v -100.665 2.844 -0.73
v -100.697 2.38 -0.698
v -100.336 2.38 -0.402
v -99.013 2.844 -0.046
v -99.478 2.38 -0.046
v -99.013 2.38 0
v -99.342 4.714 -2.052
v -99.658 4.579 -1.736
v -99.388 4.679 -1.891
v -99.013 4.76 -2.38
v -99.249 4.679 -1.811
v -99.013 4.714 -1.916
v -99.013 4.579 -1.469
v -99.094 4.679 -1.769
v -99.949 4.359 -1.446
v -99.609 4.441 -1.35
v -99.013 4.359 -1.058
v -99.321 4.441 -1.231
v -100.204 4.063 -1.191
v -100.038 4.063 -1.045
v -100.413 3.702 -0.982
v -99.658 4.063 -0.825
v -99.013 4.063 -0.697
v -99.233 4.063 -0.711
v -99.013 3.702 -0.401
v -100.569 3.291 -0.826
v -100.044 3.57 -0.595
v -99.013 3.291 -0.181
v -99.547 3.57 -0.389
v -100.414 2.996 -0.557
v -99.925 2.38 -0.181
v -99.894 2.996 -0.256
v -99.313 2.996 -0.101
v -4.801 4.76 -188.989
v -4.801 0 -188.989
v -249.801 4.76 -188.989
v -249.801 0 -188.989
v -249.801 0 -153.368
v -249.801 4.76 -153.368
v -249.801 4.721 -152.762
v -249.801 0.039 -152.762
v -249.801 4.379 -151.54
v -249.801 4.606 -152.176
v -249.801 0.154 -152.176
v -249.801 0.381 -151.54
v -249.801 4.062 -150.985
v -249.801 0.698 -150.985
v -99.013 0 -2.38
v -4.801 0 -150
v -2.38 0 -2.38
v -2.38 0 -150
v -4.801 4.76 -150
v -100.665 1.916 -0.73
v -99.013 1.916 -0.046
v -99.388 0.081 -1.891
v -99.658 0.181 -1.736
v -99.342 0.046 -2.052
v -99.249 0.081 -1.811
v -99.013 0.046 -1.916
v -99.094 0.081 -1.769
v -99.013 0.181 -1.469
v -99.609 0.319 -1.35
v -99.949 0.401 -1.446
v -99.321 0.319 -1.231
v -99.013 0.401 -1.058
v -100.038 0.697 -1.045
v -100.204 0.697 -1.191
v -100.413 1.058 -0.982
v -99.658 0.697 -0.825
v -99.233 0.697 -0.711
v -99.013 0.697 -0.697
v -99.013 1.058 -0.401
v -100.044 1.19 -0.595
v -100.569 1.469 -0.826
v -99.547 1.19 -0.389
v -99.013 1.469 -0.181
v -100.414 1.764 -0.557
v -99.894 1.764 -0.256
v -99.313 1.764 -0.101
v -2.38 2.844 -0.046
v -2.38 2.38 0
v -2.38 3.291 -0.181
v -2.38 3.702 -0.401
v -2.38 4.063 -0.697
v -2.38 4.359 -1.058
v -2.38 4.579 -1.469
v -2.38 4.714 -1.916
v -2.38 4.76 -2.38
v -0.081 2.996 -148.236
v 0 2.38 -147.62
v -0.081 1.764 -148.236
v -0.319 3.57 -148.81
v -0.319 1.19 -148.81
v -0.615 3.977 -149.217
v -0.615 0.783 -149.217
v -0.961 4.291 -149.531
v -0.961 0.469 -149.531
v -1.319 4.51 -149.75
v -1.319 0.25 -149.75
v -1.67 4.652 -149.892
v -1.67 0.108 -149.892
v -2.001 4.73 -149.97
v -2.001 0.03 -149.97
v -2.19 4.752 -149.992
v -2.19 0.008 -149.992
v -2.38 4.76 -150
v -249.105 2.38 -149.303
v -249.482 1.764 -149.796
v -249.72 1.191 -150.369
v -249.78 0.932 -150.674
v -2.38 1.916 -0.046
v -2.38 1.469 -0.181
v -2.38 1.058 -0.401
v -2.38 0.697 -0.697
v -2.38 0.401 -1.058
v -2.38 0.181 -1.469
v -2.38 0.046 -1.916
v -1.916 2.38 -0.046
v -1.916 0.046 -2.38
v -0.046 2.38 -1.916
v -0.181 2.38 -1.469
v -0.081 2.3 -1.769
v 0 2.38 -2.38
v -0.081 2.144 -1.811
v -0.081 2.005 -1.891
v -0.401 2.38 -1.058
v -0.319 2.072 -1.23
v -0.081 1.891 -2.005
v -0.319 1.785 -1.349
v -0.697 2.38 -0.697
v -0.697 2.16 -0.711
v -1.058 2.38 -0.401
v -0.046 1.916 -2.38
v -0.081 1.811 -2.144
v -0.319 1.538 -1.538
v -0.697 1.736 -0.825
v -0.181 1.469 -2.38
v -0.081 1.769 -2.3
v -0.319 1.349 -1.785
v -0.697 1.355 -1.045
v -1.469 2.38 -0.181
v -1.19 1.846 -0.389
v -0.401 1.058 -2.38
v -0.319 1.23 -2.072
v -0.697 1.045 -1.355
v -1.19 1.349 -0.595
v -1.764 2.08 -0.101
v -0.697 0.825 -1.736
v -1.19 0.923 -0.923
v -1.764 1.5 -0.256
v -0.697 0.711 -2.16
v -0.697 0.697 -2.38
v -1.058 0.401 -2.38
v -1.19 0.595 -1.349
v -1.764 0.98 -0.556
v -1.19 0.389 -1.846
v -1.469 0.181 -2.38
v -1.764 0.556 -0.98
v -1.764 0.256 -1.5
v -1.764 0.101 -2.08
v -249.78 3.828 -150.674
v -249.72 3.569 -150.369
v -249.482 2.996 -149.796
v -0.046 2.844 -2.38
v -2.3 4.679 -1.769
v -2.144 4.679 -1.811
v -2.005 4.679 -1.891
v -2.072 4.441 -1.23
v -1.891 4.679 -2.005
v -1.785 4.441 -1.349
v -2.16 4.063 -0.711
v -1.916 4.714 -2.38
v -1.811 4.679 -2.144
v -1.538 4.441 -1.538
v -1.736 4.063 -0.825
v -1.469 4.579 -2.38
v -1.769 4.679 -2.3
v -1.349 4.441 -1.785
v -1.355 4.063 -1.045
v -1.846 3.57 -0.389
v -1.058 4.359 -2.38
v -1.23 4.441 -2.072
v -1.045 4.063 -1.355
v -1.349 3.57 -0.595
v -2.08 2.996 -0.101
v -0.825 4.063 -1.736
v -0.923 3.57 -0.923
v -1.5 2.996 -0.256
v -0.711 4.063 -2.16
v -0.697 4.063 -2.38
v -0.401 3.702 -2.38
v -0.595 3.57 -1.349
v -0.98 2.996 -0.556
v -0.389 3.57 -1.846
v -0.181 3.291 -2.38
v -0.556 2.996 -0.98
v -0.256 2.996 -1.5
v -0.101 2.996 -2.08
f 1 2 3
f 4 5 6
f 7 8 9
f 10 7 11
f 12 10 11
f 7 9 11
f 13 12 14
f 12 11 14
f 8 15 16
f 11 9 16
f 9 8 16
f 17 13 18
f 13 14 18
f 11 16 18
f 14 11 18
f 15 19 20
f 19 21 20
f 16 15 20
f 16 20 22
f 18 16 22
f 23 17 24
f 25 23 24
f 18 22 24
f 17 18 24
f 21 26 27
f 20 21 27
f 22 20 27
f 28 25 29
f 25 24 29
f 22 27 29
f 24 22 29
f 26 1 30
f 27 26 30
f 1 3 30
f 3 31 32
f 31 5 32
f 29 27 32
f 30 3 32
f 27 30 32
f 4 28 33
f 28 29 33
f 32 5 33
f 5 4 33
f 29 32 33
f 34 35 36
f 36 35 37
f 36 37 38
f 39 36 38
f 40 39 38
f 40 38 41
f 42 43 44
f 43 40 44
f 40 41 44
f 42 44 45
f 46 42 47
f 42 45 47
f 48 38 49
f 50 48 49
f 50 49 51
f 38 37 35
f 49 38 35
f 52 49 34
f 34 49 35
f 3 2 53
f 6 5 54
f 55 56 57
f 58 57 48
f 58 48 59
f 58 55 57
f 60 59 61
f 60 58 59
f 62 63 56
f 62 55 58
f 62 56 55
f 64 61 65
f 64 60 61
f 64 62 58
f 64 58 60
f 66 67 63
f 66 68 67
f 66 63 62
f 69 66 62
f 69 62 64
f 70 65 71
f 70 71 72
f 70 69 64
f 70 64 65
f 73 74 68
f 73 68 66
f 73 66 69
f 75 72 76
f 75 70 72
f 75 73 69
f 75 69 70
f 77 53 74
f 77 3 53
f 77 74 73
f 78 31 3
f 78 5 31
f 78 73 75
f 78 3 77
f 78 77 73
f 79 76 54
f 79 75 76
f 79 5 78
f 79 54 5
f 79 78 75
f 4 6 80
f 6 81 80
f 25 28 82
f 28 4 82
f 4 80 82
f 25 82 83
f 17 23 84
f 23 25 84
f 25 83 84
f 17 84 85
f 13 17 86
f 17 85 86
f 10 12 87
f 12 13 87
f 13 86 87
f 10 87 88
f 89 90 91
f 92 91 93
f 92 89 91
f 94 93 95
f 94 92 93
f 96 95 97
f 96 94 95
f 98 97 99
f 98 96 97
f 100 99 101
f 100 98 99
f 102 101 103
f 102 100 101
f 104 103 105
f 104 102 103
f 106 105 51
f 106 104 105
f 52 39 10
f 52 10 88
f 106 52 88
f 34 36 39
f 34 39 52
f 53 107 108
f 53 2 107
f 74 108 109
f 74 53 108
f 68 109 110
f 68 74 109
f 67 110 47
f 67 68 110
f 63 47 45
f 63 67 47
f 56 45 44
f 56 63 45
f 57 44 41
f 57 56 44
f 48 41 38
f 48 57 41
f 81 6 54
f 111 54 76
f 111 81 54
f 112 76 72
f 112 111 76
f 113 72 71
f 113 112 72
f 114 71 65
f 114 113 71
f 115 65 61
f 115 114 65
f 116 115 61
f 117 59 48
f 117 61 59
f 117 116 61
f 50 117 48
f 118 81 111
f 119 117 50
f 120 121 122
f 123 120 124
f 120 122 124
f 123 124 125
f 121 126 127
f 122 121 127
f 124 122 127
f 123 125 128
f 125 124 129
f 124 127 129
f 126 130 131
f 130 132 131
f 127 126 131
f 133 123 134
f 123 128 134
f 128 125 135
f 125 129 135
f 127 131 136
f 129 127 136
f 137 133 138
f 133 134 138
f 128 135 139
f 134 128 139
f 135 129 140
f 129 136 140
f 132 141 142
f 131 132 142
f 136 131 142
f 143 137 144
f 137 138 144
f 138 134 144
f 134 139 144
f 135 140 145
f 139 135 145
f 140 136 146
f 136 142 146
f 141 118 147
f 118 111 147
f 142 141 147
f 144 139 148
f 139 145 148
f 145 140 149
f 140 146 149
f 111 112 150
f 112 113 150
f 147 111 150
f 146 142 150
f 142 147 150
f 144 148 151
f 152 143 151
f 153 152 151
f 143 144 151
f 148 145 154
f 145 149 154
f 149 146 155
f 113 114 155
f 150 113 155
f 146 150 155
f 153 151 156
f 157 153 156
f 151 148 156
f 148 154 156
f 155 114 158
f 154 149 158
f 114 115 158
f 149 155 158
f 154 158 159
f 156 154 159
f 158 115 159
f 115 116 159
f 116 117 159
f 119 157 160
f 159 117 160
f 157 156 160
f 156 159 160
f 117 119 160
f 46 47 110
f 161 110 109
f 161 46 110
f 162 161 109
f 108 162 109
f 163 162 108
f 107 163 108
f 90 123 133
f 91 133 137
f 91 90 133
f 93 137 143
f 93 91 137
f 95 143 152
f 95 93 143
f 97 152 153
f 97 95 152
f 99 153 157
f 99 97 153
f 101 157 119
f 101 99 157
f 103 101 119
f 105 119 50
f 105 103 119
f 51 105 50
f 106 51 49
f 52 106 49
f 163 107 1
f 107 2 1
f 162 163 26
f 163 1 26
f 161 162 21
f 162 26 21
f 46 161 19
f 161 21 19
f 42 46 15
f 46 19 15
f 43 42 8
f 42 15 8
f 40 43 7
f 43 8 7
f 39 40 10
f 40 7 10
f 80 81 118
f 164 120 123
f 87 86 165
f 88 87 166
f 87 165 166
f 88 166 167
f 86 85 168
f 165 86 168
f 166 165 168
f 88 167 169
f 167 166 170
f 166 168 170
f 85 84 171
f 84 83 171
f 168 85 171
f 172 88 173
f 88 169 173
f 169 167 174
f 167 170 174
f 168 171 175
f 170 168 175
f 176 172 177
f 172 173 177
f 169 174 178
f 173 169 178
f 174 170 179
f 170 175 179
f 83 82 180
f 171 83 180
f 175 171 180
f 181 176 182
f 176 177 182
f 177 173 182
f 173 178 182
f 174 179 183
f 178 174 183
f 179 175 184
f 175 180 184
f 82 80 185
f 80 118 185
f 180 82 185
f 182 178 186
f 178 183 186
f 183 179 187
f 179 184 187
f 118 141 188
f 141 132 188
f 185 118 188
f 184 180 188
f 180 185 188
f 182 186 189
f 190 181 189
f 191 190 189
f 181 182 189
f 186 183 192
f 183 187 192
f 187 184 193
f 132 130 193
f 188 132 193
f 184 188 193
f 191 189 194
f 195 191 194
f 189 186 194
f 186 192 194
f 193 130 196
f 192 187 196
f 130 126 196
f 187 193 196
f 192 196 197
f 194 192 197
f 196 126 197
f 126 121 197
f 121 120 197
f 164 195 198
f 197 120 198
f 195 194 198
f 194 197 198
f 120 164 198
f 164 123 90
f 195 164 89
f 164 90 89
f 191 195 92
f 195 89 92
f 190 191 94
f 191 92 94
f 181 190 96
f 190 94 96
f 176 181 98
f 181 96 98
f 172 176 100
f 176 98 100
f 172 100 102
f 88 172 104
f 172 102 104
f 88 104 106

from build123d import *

# Parameters (mm, degrees)
BOSS_EXTRUDE2_DEPTH = 4.76
FILLET11_R          = 2.38


with BuildPart() as part:
    # Sketch1 → Boss-Extrude2 (new body)
    with BuildSketch(Plane(origin=(0, 0, 0), x_dir=(1, 0, 0), z_dir=(0, 1, 0))):
        Polygon((0, 0), (0, 150), (-4.8006, 150), (-4.8006, 188.989), (-249.8006, 188.989), (-249.8006, 150), (-99.9998, 0), align=None)
    extrude(amount=BOSS_EXTRUDE2_DEPTH)

    # Fillet11
    fillet11_edges = [part.edges().sort_by_distance(p)[0] for p in [
        (-49.9999, 0, 0),
        (-99.9998, 2.38, 0),
        (-249.8006, 2.38, -150),
        (0, 2.38, -150),
        (0, 2.38, 0),
        (-174.9002, 4.76, -75),
        (-49.9999, 4.76, 0),
        (-174.9002, 0, -75),
        (0, 4.76, -75),
        (0, 0, -75),
    ]]
    fillet(fillet11_edges, radius=FILLET11_R - 0.0001)  # a hair under: the kernel refuses the full size


solid = part.part
